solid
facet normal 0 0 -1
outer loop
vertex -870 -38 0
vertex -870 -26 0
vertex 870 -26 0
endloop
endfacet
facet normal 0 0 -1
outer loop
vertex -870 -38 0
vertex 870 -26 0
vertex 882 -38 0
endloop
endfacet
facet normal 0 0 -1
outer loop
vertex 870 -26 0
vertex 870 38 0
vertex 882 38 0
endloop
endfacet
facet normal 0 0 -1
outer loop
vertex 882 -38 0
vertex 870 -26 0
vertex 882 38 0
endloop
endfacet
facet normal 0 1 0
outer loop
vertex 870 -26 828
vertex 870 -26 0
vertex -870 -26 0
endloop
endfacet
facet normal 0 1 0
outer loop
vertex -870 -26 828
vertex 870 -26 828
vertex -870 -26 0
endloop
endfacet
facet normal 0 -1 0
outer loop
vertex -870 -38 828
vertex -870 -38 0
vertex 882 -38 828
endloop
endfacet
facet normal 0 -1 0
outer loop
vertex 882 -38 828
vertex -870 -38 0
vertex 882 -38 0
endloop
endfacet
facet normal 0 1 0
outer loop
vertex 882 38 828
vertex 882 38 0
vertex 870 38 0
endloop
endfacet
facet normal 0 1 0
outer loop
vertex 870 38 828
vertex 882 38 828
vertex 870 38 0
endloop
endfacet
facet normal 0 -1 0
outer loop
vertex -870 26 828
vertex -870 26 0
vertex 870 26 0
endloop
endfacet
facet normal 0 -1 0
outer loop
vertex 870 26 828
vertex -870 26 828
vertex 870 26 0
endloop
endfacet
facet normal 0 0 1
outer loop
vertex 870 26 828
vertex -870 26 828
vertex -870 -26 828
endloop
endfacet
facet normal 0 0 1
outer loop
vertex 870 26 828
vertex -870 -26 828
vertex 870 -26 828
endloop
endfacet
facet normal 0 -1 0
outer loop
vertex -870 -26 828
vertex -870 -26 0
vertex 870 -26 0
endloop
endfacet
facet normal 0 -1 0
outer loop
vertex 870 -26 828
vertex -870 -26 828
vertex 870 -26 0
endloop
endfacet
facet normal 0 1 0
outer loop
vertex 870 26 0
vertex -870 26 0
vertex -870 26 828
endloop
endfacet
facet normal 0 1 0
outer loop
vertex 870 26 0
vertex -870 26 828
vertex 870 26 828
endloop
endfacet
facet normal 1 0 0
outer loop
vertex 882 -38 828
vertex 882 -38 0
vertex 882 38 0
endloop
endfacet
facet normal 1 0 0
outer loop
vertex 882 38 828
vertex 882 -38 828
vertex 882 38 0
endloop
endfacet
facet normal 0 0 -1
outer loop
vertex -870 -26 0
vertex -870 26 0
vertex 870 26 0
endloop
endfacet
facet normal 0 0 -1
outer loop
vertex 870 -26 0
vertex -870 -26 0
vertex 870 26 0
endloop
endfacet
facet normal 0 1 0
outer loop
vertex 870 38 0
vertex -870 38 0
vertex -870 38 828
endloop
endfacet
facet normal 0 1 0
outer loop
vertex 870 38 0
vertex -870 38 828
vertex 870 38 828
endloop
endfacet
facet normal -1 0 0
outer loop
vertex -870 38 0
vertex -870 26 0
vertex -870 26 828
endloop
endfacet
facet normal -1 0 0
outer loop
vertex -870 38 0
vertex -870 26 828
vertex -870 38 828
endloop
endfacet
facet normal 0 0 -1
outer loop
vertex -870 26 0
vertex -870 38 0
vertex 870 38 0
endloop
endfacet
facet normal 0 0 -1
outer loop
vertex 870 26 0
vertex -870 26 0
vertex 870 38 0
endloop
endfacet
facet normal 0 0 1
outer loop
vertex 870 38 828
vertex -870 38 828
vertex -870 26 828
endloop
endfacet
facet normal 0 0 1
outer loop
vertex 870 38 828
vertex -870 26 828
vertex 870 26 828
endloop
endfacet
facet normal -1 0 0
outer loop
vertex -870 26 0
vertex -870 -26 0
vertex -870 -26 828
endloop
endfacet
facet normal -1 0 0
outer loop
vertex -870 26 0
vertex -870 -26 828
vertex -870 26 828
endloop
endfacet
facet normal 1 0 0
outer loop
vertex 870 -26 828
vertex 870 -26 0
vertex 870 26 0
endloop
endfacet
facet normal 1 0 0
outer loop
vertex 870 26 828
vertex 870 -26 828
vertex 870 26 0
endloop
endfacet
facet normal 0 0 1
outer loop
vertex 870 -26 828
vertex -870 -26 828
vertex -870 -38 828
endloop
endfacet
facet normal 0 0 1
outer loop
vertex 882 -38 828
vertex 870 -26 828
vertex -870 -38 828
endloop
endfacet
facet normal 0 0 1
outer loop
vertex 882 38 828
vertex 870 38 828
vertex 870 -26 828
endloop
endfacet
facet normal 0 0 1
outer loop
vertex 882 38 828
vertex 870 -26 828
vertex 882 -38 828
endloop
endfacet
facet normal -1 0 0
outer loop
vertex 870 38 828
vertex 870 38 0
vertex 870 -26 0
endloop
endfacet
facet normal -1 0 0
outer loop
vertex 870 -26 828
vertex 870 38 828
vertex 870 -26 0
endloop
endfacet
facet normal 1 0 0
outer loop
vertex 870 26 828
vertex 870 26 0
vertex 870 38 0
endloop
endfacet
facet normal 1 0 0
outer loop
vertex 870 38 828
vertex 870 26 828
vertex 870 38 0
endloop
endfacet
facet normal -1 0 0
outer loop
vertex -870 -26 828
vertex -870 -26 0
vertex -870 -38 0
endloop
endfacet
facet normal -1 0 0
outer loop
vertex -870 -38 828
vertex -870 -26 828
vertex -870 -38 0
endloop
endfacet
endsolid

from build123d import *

# Parameters (mm, degrees)
F0_W     = 1740
F0_H     = 52
F1_DEPTH = 828
F3_DEPTH = 828
F4_W     = 1740
F4_H     = 12
F5_DEPTH = 828


with BuildPart() as f1:
    # F0 (on Top) → F1 (new body)
    with BuildSketch(Plane.XY):
        Rectangle(F0_W, F0_H)
    extrude(amount=F1_DEPTH)


with BuildPart() as f3:
    # F2 (on Top) → F3 (new body, through all)
    with BuildSketch(Plane.XY):
        Polygon((870, -26), (-870, -26), (-870, -38), (882, -38), (882, 38), (870, 38), align=None)
    extrude(amount=F3_DEPTH)


with BuildPart() as f5:
    # F4 (on Top) → F5 (new body, through all)
    with BuildSketch(Plane.XY):
        with Locations((0, 32)):
            Rectangle(F4_W, F4_H)
    extrude(amount=F5_DEPTH)


solid = Compound([f1.part, f3.part, f5.part])
